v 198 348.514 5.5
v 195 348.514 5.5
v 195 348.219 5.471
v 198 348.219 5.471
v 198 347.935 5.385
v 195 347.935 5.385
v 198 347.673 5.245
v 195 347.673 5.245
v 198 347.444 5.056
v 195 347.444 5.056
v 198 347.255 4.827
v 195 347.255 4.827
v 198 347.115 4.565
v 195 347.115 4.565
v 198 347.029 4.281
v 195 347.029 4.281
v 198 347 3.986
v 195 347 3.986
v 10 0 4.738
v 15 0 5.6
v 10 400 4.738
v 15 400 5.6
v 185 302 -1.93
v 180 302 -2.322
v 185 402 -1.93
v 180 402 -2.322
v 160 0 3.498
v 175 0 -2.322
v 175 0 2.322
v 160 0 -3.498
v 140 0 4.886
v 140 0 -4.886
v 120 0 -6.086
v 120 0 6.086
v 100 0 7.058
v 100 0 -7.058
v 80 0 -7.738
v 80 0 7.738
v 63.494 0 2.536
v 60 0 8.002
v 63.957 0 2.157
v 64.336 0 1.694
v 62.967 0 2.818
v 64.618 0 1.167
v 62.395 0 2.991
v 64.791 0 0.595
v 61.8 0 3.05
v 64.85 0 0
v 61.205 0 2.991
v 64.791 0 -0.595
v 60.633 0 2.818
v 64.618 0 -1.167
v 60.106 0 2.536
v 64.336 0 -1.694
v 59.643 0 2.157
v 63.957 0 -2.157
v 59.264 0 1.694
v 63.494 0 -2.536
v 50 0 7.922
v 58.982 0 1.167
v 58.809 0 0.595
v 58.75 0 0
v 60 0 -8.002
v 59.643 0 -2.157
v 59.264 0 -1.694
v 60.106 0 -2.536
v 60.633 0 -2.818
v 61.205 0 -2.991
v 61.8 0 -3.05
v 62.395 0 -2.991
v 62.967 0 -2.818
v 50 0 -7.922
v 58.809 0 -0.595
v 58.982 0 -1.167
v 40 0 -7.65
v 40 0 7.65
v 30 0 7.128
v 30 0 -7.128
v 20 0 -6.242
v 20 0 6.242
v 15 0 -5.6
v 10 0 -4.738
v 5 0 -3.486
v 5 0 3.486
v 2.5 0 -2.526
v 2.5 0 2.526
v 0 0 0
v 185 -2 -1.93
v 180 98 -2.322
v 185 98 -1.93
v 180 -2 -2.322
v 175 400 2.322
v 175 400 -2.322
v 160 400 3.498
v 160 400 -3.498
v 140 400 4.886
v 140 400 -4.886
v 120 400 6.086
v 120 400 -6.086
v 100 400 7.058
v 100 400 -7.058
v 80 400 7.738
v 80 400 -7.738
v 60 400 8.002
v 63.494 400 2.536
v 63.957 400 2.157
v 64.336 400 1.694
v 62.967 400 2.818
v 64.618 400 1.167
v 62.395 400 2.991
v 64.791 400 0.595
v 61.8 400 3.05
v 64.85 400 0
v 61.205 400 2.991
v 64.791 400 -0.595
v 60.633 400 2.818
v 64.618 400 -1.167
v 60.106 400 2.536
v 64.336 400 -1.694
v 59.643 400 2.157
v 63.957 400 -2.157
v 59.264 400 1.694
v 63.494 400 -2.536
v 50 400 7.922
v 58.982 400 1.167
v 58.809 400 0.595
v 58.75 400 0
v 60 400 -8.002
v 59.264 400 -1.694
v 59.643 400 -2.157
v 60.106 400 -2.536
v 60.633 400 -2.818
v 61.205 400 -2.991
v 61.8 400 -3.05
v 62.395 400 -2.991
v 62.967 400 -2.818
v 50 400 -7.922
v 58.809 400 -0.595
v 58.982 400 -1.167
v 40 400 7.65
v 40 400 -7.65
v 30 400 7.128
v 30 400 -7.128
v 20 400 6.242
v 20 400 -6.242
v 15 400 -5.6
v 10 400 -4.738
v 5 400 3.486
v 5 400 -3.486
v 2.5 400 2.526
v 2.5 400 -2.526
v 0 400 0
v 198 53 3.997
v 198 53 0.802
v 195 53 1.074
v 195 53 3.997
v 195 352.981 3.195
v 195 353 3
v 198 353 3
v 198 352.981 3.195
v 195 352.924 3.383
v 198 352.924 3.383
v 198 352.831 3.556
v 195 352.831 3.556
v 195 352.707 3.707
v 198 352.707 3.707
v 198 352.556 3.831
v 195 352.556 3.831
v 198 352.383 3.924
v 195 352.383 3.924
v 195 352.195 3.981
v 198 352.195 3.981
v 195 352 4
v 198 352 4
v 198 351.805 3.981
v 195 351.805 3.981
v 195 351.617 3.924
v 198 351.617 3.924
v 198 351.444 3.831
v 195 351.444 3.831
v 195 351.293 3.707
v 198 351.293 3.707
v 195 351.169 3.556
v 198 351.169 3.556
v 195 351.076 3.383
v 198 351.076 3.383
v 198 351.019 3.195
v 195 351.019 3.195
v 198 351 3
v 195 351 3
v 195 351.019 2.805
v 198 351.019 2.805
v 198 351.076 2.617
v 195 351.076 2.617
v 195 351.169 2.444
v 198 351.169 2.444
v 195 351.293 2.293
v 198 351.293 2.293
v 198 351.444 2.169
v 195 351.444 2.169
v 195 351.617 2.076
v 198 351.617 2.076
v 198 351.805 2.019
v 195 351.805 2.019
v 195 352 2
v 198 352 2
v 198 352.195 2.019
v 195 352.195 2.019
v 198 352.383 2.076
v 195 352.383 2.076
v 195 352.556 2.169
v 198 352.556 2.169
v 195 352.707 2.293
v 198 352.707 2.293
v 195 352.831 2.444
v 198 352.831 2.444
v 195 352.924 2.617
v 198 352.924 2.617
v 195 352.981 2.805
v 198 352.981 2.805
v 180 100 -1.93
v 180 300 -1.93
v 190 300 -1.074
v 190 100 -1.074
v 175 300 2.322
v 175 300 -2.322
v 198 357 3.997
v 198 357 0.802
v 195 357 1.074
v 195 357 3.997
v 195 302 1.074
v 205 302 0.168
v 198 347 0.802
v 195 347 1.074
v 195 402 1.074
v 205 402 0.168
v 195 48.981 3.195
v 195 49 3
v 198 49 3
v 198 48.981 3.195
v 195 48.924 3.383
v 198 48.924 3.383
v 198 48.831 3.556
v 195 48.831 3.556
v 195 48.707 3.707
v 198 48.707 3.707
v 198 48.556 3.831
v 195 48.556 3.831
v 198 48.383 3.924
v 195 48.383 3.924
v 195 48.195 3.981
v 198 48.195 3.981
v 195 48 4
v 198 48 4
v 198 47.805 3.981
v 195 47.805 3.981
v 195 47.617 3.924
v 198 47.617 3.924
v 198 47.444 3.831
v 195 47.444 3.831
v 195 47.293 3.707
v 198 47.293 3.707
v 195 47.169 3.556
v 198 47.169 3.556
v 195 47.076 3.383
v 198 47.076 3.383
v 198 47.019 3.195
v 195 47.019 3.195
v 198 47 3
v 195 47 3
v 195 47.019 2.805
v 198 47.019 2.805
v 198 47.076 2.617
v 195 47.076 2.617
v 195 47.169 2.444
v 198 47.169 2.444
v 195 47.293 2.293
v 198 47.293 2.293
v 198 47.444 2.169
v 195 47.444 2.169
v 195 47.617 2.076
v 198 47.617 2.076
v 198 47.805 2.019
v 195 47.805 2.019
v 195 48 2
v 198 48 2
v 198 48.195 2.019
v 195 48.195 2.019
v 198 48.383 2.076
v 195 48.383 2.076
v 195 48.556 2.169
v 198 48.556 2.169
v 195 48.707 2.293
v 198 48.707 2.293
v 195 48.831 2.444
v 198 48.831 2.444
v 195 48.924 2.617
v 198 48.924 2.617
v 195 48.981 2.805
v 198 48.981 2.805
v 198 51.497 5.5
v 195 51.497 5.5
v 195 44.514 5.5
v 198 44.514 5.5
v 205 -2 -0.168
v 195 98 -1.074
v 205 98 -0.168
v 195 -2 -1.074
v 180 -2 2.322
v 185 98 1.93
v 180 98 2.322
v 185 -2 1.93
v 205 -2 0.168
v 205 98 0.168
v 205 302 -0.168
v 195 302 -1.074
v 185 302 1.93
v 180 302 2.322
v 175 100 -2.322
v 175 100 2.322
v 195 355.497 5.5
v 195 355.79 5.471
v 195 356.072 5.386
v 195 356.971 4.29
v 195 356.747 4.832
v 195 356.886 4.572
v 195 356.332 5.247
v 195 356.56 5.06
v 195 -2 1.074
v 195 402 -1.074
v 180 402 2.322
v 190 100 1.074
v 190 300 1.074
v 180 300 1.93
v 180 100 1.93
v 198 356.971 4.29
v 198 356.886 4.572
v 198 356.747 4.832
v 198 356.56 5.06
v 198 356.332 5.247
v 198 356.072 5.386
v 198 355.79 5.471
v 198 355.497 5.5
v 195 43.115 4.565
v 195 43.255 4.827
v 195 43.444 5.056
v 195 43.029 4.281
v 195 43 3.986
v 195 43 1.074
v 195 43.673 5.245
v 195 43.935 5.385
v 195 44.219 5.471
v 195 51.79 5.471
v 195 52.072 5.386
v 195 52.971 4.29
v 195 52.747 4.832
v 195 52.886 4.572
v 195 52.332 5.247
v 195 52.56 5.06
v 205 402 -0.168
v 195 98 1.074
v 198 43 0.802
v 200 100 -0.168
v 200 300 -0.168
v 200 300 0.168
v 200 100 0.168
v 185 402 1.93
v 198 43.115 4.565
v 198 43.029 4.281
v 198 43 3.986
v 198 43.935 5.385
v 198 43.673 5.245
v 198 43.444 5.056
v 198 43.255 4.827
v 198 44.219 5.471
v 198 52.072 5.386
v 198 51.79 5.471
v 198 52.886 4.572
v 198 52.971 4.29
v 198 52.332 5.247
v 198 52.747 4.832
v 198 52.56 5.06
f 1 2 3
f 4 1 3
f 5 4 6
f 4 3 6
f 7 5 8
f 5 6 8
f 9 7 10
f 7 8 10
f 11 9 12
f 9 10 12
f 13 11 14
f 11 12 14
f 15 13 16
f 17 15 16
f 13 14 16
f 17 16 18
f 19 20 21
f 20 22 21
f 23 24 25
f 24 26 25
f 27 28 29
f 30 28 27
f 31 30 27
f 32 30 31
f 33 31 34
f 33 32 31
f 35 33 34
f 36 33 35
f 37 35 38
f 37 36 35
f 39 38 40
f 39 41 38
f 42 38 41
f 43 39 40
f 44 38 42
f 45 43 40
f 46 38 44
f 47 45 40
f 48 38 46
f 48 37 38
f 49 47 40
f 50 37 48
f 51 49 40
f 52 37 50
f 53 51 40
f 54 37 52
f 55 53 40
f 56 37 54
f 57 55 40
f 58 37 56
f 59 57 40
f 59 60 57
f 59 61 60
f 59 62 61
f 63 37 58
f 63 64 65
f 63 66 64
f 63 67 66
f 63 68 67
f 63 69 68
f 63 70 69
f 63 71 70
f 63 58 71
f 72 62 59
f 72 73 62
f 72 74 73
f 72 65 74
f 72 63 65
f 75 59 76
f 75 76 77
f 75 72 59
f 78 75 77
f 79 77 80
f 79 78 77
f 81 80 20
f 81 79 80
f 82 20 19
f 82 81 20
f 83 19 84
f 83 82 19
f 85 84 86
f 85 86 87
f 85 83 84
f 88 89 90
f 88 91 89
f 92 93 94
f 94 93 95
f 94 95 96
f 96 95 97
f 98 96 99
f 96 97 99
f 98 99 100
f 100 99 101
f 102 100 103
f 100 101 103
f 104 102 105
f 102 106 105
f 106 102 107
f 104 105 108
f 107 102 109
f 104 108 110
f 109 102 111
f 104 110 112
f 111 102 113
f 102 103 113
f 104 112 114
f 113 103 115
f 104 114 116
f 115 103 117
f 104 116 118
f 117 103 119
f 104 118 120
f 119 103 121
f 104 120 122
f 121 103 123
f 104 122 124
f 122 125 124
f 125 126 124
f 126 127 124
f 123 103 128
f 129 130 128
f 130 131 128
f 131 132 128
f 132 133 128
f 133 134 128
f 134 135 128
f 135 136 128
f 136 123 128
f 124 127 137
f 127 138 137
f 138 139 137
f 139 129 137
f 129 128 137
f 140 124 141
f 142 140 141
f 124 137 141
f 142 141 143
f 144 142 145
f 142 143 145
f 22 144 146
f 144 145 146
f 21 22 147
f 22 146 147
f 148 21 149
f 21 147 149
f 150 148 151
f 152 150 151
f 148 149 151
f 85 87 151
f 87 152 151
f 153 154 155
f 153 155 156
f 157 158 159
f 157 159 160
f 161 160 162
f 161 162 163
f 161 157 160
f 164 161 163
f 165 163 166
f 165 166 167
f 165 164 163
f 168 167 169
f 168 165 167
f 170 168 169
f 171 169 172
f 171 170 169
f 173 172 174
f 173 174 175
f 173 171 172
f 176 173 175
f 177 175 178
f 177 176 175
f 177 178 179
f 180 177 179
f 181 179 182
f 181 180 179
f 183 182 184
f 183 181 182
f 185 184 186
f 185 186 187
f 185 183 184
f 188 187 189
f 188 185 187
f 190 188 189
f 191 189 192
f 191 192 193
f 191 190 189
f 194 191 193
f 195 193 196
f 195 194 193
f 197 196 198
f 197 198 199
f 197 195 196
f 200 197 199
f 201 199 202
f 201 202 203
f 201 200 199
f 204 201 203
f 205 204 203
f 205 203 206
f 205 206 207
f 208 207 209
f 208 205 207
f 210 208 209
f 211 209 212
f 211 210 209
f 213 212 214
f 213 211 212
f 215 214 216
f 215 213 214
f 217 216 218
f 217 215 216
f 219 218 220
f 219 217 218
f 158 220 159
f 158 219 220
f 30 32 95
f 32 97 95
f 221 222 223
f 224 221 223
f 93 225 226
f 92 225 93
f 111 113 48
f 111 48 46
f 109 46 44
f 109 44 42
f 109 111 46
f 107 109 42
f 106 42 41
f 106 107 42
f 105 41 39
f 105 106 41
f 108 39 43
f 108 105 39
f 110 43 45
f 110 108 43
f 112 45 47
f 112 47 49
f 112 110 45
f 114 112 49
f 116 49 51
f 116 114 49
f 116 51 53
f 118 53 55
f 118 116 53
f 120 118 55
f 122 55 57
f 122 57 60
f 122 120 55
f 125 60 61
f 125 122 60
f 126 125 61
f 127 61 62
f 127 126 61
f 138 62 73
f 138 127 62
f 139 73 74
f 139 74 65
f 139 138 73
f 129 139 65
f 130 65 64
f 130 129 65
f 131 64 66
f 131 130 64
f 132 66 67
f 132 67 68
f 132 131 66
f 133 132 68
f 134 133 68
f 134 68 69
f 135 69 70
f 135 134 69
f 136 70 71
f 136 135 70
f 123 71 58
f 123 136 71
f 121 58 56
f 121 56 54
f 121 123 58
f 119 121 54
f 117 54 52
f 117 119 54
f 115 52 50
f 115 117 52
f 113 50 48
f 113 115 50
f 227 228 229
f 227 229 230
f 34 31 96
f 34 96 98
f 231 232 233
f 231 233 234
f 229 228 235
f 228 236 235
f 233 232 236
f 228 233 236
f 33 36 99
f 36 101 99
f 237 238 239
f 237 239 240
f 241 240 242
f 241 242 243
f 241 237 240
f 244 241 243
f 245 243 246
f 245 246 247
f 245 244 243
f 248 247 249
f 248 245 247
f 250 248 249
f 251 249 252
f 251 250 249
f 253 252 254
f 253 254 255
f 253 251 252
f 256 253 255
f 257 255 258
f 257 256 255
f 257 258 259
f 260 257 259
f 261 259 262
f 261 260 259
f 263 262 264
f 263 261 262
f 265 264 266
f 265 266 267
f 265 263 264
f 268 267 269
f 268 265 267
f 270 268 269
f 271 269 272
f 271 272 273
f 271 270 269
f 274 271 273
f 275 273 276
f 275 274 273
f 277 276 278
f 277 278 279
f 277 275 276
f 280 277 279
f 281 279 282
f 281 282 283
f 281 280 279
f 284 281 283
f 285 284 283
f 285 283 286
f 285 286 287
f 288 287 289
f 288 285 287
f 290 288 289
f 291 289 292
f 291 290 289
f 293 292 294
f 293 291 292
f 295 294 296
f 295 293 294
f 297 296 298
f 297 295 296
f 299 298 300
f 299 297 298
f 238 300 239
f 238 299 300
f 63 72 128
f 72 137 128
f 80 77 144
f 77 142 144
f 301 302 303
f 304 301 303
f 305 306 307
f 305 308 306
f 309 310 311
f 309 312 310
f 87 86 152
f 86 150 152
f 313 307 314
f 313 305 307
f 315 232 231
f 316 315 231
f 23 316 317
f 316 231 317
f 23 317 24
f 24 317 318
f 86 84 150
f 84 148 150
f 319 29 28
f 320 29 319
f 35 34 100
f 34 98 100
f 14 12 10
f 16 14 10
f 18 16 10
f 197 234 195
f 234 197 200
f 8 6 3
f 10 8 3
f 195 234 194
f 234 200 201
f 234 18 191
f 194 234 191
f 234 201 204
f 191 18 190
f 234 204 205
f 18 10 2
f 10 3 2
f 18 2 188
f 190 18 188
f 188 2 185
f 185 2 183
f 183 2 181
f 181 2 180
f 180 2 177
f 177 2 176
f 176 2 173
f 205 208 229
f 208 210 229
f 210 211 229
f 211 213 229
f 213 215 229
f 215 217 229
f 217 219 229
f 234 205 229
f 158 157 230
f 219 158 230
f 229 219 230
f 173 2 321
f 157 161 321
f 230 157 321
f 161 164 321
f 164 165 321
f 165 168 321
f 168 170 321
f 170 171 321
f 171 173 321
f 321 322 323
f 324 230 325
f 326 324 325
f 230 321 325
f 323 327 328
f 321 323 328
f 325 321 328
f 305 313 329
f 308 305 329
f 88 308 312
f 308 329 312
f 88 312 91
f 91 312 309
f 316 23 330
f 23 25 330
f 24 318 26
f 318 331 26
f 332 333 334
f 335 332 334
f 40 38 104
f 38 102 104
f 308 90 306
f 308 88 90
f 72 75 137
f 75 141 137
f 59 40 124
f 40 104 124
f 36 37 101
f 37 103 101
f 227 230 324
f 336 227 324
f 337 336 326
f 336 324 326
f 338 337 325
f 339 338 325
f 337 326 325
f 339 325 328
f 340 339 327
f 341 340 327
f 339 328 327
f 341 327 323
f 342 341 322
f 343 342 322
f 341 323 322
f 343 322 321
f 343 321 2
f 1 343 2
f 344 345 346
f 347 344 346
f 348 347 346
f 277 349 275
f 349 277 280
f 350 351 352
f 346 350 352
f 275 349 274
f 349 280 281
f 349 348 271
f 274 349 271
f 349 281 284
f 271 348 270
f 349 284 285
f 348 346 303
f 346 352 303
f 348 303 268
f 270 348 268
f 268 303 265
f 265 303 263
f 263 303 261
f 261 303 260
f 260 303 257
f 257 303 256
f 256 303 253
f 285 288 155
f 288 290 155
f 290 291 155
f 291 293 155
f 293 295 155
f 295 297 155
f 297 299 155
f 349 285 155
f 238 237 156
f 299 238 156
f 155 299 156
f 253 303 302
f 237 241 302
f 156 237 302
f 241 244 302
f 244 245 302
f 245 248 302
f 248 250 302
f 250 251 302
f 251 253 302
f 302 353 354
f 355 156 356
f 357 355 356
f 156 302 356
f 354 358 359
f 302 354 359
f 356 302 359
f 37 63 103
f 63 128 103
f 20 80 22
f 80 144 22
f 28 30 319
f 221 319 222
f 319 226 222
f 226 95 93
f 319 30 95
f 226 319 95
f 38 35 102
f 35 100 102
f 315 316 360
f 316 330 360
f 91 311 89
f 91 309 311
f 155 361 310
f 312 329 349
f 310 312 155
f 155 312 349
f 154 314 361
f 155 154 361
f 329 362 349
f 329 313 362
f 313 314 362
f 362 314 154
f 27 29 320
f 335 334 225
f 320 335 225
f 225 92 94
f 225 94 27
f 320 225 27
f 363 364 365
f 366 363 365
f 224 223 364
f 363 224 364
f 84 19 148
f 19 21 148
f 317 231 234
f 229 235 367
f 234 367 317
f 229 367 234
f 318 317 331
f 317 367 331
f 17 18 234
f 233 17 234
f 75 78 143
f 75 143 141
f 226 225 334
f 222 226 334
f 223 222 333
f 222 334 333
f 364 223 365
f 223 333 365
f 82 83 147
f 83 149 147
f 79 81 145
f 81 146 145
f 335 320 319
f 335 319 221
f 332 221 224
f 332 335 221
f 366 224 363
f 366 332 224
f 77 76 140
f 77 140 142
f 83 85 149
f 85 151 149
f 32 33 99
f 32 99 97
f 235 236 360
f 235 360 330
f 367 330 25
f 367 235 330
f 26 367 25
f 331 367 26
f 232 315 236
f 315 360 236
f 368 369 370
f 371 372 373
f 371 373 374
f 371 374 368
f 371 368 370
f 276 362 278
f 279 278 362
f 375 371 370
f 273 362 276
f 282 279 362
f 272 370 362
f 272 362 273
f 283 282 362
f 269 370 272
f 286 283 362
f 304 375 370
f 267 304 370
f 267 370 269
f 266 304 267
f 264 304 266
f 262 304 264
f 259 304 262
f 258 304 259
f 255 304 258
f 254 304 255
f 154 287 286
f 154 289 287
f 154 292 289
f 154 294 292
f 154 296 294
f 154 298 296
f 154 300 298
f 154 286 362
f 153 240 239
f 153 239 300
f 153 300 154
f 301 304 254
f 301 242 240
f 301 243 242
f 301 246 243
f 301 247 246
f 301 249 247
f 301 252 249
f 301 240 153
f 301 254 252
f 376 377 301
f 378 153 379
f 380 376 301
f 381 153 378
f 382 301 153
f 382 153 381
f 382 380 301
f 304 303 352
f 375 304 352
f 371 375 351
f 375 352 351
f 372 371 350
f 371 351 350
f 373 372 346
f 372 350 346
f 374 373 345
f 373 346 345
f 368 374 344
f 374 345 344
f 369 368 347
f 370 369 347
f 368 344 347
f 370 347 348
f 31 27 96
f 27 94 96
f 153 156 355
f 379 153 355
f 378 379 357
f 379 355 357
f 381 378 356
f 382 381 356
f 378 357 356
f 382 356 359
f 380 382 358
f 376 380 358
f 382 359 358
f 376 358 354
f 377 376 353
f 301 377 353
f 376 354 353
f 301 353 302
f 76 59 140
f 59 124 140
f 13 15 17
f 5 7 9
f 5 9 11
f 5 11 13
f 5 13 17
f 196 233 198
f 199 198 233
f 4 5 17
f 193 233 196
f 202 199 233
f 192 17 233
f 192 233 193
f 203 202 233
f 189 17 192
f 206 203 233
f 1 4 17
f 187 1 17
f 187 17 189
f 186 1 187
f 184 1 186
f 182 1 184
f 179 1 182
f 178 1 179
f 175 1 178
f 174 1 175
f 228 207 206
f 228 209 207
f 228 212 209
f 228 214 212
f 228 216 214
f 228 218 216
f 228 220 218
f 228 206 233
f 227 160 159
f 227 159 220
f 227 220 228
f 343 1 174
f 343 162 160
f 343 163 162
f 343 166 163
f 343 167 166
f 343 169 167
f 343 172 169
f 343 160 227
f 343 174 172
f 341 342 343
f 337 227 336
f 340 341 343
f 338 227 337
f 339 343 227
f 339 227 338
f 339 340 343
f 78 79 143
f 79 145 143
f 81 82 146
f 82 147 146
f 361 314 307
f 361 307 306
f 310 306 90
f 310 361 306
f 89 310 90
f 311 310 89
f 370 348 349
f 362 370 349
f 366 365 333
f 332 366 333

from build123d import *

# Parameters (mm, degrees)
SKETCH005_W    = 25
SKETCH005_H    = 100
PAD_DEPTH      = 10
SKETCH006_W    = 25
SKETCH006_H    = 100
PAD001_DEPTH   = 10
CYLINDER_R     = 3.05
CYLINDER_DEPTH = 400
SKETCH012_R    = 1
PAD003_DEPTH   = 3
SKETCH011_R    = 1
PAD002_DEPTH   = 3


with BuildPart() as body:
    # Sketch005 → Pad (new body, symmetric)
    with BuildSketch(Plane.XY):
        with Locations((187.5, 50)):
            Rectangle(SKETCH005_W, SKETCH005_H)
    extrude(amount=PAD_DEPTH, both=True)


with BuildPart() as body002:
    # Sketch006 → Pad001 (new body, symmetric)
    with BuildSketch(Plane(origin=(0, 300, 0), x_dir=(1, 0, 0), z_dir=(0, 0, 1))):
        with Locations((187.5, 50)):
            Rectangle(SKETCH006_W, SKETCH006_H)
    extrude(amount=PAD001_DEPTH, both=True)


with BuildPart() as body003:
    # Cylinder → Cylinder (join)
    with BuildSketch(Plane(origin=(61.8, 400, 0), x_dir=(1, 0, 0), z_dir=(0, -1, 0))):
        Circle(CYLINDER_R)
    extrude(amount=CYLINDER_DEPTH)


with BuildPart() as stab:
    # Sketch → AdditiveLoft section 0
    with BuildSketch(Plane.XZ):
        Polygon((200, 0.168), (190, 1.074), (180, 1.93), (160, 3.498), (140, 4.886), (120, 6.086), (100, 7.058), (80, 7.738), (60, 8.002), (50, 7.922), (40, 7.65), (30, 7.128), (20, 6.242), (15, 5.6), (10, 4.738), (5, 3.486), (2.5, 2.526), (0, 0), (2.5, -2.526), (5, -3.486), (10, -4.738), (15, -5.6), (20, -6.242), (30, -7.128), (40, -7.65), (50, -7.922), (60, -8.002), (80, -7.738), (100, -7.058), (120, -6.086), (140, -4.886), (160, -3.498), (180, -1.93), (190, -1.074), (200, -0.168), align=None)
    # Sketch001 → AdditiveLoft section 1
    with BuildSketch(Plane.XZ.offset(-100)):
        Polygon((200, 0.168), (190, 1.074), (180, 1.93), (160, 3.498), (140, 4.886), (120, 6.086), (100, 7.058), (80, 7.738), (60, 8.002), (50, 7.922), (40, 7.65), (30, 7.128), (20, 6.242), (15, 5.6), (10, 4.738), (5, 3.486), (2.5, 2.526), (0, 0), (2.5, -2.526), (5, -3.486), (10, -4.738), (15, -5.6), (20, -6.242), (30, -7.128), (40, -7.65), (50, -7.922), (60, -8.002), (80, -7.738), (100, -7.058), (120, -6.086), (140, -4.886), (160, -3.498), (180, -1.93), (190, -1.074), (200, -0.168), align=None)
    # Sketch002 → AdditiveLoft section 2
    with BuildSketch(Plane.XZ.offset(-200)):
        Polygon((200, 0.168), (190, 1.074), (180, 1.93), (160, 3.498), (140, 4.886), (120, 6.086), (100, 7.058), (80, 7.738), (60, 8.002), (50, 7.922), (40, 7.65), (30, 7.128), (20, 6.242), (15, 5.6), (10, 4.738), (5, 3.486), (2.5, 2.526), (0, 0), (2.5, -2.526), (5, -3.486), (10, -4.738), (15, -5.6), (20, -6.242), (30, -7.128), (40, -7.65), (50, -7.922), (60, -8.002), (80, -7.738), (100, -7.058), (120, -6.086), (140, -4.886), (160, -3.498), (180, -1.93), (190, -1.074), (200, -0.168), align=None)
    # Sketch003 → AdditiveLoft section 3
    with BuildSketch(Plane.XZ.offset(-300)):
        Polygon((200, 0.168), (190, 1.074), (180, 1.93), (160, 3.498), (140, 4.886), (120, 6.086), (100, 7.058), (80, 7.738), (60, 8.002), (50, 7.922), (40, 7.65), (30, 7.128), (20, 6.242), (15, 5.6), (10, 4.738), (5, 3.486), (2.5, 2.526), (0, 0), (2.5, -2.526), (5, -3.486), (10, -4.738), (15, -5.6), (20, -6.242), (30, -7.128), (40, -7.65), (50, -7.922), (60, -8.002), (80, -7.738), (100, -7.058), (120, -6.086), (140, -4.886), (160, -3.498), (180, -1.93), (190, -1.074), (200, -0.168), align=None)
    # Sketch004 → AdditiveLoft section 4
    with BuildSketch(Plane.XZ.offset(-400)):
        Polygon((200, 0.168), (190, 1.074), (180, 1.93), (160, 3.498), (140, 4.886), (120, 6.086), (100, 7.058), (80, 7.738), (60, 8.002), (50, 7.922), (40, 7.65), (30, 7.128), (20, 6.242), (15, 5.6), (10, 4.738), (5, 3.486), (2.5, 2.526), (0, 0), (2.5, -2.526), (5, -3.486), (10, -4.738), (15, -5.6), (20, -6.242), (30, -7.128), (40, -7.65), (50, -7.922), (60, -8.002), (80, -7.738), (100, -7.058), (120, -6.086), (140, -4.886), (160, -3.498), (180, -1.93), (190, -1.074), (200, -0.168), align=None)
    loft()

    # Boolean: cut Body, Body002, Body003
    add(body.part, mode=Mode.SUBTRACT)
    add(body002.part, mode=Mode.SUBTRACT)
    add(body003.part, mode=Mode.SUBTRACT)


with BuildPart() as body007:
    # Sketch012 → Pad003 (new body)
    with BuildSketch(Plane.YZ):
        with BuildLine():
            Line((-5, -2.5), (5, -2.5))
            Line((5, -2.5), (5, 0.996815))
            ThreePointArc((5, 0.996815), (4.559727, 2.059727), (3.496815, 2.5))
            Line((3.496815, 2.5), (-3.485502, 2.5))
            ThreePointArc((-3.485502, 2.5), (-4.556414, 2.056414), (-5, 0.985503))
            Line((-5, 0.985503), (-5, -2.5))
        make_face()
        Circle(SKETCH012_R, mode=Mode.SUBTRACT)
    extrude(amount=PAD003_DEPTH)


with BuildPart() as body007_1:
    # Body007 placement: moved
    add(body007.part.moved(Location((195, 352, 3))))


with BuildPart() as trim_right:
    # Sketch007 → AdditiveLoft001 section 0
    with BuildSketch(Plane(origin=(5, 302, 0), x_dir=(1, 0, 0), z_dir=(0, -1, 0))):
        Polygon((200, 0.168), (190, 1.074), (180, 1.93), (175.00003, 2.321998), (175.00003, -2.321998), (180, -1.93), (190, -1.074), (200, -0.168), align=None)
    # Sketch008 → AdditiveLoft001 section 1
    with BuildSketch(Plane(origin=(5, 402, 0), x_dir=(1, 0, 0), z_dir=(0, -1, 0))):
        Polygon((200, 0.168), (190, 1.074), (180, 1.93), (175.00003, 2.321998), (175.00003, -2.321998), (180, -1.93), (190, -1.074), (200, -0.168), align=None)
    loft()

    # Boolean001: union Body007
    add(body007_1.part)


with BuildPart() as body006:
    # Sketch011 → Pad002 (new body)
    with BuildSketch(Plane.YZ):
        with BuildLine():
            Line((-5, -2.5), (5, -2.5))
            Line((5, -2.5), (5, 0.996815))
            ThreePointArc((5, 0.996815), (4.559727, 2.059727), (3.496815, 2.5))
            Line((3.496815, 2.5), (-3.485502, 2.5))
            ThreePointArc((-3.485502, 2.5), (-4.556414, 2.056414), (-5, 0.985503))
            Line((-5, 0.985503), (-5, -2.5))
        make_face()
        Circle(SKETCH011_R, mode=Mode.SUBTRACT)
    extrude(amount=PAD002_DEPTH)


with BuildPart() as body006_1:
    # Body006 placement: moved
    add(body006.part.moved(Location((195, 48, 3))))


with BuildPart() as trim_left:
    # Sketch010 → AdditiveLoft002 section 0
    with BuildSketch(Plane(origin=(5, 98, 0), x_dir=(1, 0, 0), z_dir=(0, -1, 0))):
        Polygon((200, 0.168), (190, 1.074), (180, 1.93), (175.00003, 2.321998), (175.00003, -2.321998), (180, -1.93), (190, -1.074), (200, -0.168), align=None)
    # Sketch009 → AdditiveLoft002 section 1
    with BuildSketch(Plane(origin=(5, -2, 0), x_dir=(1, 0, 0), z_dir=(0, -1, 0))):
        Polygon((200, 0.168), (190, 1.074), (180, 1.93), (175.00003, 2.321998), (175.00003, -2.321998), (180, -1.93), (190, -1.074), (200, -0.168), align=None)
    loft()

    # Boolean002: union Body006
    add(body006_1.part)


solid = Compound([stab.part, trim_right.part, trim_left.part])
